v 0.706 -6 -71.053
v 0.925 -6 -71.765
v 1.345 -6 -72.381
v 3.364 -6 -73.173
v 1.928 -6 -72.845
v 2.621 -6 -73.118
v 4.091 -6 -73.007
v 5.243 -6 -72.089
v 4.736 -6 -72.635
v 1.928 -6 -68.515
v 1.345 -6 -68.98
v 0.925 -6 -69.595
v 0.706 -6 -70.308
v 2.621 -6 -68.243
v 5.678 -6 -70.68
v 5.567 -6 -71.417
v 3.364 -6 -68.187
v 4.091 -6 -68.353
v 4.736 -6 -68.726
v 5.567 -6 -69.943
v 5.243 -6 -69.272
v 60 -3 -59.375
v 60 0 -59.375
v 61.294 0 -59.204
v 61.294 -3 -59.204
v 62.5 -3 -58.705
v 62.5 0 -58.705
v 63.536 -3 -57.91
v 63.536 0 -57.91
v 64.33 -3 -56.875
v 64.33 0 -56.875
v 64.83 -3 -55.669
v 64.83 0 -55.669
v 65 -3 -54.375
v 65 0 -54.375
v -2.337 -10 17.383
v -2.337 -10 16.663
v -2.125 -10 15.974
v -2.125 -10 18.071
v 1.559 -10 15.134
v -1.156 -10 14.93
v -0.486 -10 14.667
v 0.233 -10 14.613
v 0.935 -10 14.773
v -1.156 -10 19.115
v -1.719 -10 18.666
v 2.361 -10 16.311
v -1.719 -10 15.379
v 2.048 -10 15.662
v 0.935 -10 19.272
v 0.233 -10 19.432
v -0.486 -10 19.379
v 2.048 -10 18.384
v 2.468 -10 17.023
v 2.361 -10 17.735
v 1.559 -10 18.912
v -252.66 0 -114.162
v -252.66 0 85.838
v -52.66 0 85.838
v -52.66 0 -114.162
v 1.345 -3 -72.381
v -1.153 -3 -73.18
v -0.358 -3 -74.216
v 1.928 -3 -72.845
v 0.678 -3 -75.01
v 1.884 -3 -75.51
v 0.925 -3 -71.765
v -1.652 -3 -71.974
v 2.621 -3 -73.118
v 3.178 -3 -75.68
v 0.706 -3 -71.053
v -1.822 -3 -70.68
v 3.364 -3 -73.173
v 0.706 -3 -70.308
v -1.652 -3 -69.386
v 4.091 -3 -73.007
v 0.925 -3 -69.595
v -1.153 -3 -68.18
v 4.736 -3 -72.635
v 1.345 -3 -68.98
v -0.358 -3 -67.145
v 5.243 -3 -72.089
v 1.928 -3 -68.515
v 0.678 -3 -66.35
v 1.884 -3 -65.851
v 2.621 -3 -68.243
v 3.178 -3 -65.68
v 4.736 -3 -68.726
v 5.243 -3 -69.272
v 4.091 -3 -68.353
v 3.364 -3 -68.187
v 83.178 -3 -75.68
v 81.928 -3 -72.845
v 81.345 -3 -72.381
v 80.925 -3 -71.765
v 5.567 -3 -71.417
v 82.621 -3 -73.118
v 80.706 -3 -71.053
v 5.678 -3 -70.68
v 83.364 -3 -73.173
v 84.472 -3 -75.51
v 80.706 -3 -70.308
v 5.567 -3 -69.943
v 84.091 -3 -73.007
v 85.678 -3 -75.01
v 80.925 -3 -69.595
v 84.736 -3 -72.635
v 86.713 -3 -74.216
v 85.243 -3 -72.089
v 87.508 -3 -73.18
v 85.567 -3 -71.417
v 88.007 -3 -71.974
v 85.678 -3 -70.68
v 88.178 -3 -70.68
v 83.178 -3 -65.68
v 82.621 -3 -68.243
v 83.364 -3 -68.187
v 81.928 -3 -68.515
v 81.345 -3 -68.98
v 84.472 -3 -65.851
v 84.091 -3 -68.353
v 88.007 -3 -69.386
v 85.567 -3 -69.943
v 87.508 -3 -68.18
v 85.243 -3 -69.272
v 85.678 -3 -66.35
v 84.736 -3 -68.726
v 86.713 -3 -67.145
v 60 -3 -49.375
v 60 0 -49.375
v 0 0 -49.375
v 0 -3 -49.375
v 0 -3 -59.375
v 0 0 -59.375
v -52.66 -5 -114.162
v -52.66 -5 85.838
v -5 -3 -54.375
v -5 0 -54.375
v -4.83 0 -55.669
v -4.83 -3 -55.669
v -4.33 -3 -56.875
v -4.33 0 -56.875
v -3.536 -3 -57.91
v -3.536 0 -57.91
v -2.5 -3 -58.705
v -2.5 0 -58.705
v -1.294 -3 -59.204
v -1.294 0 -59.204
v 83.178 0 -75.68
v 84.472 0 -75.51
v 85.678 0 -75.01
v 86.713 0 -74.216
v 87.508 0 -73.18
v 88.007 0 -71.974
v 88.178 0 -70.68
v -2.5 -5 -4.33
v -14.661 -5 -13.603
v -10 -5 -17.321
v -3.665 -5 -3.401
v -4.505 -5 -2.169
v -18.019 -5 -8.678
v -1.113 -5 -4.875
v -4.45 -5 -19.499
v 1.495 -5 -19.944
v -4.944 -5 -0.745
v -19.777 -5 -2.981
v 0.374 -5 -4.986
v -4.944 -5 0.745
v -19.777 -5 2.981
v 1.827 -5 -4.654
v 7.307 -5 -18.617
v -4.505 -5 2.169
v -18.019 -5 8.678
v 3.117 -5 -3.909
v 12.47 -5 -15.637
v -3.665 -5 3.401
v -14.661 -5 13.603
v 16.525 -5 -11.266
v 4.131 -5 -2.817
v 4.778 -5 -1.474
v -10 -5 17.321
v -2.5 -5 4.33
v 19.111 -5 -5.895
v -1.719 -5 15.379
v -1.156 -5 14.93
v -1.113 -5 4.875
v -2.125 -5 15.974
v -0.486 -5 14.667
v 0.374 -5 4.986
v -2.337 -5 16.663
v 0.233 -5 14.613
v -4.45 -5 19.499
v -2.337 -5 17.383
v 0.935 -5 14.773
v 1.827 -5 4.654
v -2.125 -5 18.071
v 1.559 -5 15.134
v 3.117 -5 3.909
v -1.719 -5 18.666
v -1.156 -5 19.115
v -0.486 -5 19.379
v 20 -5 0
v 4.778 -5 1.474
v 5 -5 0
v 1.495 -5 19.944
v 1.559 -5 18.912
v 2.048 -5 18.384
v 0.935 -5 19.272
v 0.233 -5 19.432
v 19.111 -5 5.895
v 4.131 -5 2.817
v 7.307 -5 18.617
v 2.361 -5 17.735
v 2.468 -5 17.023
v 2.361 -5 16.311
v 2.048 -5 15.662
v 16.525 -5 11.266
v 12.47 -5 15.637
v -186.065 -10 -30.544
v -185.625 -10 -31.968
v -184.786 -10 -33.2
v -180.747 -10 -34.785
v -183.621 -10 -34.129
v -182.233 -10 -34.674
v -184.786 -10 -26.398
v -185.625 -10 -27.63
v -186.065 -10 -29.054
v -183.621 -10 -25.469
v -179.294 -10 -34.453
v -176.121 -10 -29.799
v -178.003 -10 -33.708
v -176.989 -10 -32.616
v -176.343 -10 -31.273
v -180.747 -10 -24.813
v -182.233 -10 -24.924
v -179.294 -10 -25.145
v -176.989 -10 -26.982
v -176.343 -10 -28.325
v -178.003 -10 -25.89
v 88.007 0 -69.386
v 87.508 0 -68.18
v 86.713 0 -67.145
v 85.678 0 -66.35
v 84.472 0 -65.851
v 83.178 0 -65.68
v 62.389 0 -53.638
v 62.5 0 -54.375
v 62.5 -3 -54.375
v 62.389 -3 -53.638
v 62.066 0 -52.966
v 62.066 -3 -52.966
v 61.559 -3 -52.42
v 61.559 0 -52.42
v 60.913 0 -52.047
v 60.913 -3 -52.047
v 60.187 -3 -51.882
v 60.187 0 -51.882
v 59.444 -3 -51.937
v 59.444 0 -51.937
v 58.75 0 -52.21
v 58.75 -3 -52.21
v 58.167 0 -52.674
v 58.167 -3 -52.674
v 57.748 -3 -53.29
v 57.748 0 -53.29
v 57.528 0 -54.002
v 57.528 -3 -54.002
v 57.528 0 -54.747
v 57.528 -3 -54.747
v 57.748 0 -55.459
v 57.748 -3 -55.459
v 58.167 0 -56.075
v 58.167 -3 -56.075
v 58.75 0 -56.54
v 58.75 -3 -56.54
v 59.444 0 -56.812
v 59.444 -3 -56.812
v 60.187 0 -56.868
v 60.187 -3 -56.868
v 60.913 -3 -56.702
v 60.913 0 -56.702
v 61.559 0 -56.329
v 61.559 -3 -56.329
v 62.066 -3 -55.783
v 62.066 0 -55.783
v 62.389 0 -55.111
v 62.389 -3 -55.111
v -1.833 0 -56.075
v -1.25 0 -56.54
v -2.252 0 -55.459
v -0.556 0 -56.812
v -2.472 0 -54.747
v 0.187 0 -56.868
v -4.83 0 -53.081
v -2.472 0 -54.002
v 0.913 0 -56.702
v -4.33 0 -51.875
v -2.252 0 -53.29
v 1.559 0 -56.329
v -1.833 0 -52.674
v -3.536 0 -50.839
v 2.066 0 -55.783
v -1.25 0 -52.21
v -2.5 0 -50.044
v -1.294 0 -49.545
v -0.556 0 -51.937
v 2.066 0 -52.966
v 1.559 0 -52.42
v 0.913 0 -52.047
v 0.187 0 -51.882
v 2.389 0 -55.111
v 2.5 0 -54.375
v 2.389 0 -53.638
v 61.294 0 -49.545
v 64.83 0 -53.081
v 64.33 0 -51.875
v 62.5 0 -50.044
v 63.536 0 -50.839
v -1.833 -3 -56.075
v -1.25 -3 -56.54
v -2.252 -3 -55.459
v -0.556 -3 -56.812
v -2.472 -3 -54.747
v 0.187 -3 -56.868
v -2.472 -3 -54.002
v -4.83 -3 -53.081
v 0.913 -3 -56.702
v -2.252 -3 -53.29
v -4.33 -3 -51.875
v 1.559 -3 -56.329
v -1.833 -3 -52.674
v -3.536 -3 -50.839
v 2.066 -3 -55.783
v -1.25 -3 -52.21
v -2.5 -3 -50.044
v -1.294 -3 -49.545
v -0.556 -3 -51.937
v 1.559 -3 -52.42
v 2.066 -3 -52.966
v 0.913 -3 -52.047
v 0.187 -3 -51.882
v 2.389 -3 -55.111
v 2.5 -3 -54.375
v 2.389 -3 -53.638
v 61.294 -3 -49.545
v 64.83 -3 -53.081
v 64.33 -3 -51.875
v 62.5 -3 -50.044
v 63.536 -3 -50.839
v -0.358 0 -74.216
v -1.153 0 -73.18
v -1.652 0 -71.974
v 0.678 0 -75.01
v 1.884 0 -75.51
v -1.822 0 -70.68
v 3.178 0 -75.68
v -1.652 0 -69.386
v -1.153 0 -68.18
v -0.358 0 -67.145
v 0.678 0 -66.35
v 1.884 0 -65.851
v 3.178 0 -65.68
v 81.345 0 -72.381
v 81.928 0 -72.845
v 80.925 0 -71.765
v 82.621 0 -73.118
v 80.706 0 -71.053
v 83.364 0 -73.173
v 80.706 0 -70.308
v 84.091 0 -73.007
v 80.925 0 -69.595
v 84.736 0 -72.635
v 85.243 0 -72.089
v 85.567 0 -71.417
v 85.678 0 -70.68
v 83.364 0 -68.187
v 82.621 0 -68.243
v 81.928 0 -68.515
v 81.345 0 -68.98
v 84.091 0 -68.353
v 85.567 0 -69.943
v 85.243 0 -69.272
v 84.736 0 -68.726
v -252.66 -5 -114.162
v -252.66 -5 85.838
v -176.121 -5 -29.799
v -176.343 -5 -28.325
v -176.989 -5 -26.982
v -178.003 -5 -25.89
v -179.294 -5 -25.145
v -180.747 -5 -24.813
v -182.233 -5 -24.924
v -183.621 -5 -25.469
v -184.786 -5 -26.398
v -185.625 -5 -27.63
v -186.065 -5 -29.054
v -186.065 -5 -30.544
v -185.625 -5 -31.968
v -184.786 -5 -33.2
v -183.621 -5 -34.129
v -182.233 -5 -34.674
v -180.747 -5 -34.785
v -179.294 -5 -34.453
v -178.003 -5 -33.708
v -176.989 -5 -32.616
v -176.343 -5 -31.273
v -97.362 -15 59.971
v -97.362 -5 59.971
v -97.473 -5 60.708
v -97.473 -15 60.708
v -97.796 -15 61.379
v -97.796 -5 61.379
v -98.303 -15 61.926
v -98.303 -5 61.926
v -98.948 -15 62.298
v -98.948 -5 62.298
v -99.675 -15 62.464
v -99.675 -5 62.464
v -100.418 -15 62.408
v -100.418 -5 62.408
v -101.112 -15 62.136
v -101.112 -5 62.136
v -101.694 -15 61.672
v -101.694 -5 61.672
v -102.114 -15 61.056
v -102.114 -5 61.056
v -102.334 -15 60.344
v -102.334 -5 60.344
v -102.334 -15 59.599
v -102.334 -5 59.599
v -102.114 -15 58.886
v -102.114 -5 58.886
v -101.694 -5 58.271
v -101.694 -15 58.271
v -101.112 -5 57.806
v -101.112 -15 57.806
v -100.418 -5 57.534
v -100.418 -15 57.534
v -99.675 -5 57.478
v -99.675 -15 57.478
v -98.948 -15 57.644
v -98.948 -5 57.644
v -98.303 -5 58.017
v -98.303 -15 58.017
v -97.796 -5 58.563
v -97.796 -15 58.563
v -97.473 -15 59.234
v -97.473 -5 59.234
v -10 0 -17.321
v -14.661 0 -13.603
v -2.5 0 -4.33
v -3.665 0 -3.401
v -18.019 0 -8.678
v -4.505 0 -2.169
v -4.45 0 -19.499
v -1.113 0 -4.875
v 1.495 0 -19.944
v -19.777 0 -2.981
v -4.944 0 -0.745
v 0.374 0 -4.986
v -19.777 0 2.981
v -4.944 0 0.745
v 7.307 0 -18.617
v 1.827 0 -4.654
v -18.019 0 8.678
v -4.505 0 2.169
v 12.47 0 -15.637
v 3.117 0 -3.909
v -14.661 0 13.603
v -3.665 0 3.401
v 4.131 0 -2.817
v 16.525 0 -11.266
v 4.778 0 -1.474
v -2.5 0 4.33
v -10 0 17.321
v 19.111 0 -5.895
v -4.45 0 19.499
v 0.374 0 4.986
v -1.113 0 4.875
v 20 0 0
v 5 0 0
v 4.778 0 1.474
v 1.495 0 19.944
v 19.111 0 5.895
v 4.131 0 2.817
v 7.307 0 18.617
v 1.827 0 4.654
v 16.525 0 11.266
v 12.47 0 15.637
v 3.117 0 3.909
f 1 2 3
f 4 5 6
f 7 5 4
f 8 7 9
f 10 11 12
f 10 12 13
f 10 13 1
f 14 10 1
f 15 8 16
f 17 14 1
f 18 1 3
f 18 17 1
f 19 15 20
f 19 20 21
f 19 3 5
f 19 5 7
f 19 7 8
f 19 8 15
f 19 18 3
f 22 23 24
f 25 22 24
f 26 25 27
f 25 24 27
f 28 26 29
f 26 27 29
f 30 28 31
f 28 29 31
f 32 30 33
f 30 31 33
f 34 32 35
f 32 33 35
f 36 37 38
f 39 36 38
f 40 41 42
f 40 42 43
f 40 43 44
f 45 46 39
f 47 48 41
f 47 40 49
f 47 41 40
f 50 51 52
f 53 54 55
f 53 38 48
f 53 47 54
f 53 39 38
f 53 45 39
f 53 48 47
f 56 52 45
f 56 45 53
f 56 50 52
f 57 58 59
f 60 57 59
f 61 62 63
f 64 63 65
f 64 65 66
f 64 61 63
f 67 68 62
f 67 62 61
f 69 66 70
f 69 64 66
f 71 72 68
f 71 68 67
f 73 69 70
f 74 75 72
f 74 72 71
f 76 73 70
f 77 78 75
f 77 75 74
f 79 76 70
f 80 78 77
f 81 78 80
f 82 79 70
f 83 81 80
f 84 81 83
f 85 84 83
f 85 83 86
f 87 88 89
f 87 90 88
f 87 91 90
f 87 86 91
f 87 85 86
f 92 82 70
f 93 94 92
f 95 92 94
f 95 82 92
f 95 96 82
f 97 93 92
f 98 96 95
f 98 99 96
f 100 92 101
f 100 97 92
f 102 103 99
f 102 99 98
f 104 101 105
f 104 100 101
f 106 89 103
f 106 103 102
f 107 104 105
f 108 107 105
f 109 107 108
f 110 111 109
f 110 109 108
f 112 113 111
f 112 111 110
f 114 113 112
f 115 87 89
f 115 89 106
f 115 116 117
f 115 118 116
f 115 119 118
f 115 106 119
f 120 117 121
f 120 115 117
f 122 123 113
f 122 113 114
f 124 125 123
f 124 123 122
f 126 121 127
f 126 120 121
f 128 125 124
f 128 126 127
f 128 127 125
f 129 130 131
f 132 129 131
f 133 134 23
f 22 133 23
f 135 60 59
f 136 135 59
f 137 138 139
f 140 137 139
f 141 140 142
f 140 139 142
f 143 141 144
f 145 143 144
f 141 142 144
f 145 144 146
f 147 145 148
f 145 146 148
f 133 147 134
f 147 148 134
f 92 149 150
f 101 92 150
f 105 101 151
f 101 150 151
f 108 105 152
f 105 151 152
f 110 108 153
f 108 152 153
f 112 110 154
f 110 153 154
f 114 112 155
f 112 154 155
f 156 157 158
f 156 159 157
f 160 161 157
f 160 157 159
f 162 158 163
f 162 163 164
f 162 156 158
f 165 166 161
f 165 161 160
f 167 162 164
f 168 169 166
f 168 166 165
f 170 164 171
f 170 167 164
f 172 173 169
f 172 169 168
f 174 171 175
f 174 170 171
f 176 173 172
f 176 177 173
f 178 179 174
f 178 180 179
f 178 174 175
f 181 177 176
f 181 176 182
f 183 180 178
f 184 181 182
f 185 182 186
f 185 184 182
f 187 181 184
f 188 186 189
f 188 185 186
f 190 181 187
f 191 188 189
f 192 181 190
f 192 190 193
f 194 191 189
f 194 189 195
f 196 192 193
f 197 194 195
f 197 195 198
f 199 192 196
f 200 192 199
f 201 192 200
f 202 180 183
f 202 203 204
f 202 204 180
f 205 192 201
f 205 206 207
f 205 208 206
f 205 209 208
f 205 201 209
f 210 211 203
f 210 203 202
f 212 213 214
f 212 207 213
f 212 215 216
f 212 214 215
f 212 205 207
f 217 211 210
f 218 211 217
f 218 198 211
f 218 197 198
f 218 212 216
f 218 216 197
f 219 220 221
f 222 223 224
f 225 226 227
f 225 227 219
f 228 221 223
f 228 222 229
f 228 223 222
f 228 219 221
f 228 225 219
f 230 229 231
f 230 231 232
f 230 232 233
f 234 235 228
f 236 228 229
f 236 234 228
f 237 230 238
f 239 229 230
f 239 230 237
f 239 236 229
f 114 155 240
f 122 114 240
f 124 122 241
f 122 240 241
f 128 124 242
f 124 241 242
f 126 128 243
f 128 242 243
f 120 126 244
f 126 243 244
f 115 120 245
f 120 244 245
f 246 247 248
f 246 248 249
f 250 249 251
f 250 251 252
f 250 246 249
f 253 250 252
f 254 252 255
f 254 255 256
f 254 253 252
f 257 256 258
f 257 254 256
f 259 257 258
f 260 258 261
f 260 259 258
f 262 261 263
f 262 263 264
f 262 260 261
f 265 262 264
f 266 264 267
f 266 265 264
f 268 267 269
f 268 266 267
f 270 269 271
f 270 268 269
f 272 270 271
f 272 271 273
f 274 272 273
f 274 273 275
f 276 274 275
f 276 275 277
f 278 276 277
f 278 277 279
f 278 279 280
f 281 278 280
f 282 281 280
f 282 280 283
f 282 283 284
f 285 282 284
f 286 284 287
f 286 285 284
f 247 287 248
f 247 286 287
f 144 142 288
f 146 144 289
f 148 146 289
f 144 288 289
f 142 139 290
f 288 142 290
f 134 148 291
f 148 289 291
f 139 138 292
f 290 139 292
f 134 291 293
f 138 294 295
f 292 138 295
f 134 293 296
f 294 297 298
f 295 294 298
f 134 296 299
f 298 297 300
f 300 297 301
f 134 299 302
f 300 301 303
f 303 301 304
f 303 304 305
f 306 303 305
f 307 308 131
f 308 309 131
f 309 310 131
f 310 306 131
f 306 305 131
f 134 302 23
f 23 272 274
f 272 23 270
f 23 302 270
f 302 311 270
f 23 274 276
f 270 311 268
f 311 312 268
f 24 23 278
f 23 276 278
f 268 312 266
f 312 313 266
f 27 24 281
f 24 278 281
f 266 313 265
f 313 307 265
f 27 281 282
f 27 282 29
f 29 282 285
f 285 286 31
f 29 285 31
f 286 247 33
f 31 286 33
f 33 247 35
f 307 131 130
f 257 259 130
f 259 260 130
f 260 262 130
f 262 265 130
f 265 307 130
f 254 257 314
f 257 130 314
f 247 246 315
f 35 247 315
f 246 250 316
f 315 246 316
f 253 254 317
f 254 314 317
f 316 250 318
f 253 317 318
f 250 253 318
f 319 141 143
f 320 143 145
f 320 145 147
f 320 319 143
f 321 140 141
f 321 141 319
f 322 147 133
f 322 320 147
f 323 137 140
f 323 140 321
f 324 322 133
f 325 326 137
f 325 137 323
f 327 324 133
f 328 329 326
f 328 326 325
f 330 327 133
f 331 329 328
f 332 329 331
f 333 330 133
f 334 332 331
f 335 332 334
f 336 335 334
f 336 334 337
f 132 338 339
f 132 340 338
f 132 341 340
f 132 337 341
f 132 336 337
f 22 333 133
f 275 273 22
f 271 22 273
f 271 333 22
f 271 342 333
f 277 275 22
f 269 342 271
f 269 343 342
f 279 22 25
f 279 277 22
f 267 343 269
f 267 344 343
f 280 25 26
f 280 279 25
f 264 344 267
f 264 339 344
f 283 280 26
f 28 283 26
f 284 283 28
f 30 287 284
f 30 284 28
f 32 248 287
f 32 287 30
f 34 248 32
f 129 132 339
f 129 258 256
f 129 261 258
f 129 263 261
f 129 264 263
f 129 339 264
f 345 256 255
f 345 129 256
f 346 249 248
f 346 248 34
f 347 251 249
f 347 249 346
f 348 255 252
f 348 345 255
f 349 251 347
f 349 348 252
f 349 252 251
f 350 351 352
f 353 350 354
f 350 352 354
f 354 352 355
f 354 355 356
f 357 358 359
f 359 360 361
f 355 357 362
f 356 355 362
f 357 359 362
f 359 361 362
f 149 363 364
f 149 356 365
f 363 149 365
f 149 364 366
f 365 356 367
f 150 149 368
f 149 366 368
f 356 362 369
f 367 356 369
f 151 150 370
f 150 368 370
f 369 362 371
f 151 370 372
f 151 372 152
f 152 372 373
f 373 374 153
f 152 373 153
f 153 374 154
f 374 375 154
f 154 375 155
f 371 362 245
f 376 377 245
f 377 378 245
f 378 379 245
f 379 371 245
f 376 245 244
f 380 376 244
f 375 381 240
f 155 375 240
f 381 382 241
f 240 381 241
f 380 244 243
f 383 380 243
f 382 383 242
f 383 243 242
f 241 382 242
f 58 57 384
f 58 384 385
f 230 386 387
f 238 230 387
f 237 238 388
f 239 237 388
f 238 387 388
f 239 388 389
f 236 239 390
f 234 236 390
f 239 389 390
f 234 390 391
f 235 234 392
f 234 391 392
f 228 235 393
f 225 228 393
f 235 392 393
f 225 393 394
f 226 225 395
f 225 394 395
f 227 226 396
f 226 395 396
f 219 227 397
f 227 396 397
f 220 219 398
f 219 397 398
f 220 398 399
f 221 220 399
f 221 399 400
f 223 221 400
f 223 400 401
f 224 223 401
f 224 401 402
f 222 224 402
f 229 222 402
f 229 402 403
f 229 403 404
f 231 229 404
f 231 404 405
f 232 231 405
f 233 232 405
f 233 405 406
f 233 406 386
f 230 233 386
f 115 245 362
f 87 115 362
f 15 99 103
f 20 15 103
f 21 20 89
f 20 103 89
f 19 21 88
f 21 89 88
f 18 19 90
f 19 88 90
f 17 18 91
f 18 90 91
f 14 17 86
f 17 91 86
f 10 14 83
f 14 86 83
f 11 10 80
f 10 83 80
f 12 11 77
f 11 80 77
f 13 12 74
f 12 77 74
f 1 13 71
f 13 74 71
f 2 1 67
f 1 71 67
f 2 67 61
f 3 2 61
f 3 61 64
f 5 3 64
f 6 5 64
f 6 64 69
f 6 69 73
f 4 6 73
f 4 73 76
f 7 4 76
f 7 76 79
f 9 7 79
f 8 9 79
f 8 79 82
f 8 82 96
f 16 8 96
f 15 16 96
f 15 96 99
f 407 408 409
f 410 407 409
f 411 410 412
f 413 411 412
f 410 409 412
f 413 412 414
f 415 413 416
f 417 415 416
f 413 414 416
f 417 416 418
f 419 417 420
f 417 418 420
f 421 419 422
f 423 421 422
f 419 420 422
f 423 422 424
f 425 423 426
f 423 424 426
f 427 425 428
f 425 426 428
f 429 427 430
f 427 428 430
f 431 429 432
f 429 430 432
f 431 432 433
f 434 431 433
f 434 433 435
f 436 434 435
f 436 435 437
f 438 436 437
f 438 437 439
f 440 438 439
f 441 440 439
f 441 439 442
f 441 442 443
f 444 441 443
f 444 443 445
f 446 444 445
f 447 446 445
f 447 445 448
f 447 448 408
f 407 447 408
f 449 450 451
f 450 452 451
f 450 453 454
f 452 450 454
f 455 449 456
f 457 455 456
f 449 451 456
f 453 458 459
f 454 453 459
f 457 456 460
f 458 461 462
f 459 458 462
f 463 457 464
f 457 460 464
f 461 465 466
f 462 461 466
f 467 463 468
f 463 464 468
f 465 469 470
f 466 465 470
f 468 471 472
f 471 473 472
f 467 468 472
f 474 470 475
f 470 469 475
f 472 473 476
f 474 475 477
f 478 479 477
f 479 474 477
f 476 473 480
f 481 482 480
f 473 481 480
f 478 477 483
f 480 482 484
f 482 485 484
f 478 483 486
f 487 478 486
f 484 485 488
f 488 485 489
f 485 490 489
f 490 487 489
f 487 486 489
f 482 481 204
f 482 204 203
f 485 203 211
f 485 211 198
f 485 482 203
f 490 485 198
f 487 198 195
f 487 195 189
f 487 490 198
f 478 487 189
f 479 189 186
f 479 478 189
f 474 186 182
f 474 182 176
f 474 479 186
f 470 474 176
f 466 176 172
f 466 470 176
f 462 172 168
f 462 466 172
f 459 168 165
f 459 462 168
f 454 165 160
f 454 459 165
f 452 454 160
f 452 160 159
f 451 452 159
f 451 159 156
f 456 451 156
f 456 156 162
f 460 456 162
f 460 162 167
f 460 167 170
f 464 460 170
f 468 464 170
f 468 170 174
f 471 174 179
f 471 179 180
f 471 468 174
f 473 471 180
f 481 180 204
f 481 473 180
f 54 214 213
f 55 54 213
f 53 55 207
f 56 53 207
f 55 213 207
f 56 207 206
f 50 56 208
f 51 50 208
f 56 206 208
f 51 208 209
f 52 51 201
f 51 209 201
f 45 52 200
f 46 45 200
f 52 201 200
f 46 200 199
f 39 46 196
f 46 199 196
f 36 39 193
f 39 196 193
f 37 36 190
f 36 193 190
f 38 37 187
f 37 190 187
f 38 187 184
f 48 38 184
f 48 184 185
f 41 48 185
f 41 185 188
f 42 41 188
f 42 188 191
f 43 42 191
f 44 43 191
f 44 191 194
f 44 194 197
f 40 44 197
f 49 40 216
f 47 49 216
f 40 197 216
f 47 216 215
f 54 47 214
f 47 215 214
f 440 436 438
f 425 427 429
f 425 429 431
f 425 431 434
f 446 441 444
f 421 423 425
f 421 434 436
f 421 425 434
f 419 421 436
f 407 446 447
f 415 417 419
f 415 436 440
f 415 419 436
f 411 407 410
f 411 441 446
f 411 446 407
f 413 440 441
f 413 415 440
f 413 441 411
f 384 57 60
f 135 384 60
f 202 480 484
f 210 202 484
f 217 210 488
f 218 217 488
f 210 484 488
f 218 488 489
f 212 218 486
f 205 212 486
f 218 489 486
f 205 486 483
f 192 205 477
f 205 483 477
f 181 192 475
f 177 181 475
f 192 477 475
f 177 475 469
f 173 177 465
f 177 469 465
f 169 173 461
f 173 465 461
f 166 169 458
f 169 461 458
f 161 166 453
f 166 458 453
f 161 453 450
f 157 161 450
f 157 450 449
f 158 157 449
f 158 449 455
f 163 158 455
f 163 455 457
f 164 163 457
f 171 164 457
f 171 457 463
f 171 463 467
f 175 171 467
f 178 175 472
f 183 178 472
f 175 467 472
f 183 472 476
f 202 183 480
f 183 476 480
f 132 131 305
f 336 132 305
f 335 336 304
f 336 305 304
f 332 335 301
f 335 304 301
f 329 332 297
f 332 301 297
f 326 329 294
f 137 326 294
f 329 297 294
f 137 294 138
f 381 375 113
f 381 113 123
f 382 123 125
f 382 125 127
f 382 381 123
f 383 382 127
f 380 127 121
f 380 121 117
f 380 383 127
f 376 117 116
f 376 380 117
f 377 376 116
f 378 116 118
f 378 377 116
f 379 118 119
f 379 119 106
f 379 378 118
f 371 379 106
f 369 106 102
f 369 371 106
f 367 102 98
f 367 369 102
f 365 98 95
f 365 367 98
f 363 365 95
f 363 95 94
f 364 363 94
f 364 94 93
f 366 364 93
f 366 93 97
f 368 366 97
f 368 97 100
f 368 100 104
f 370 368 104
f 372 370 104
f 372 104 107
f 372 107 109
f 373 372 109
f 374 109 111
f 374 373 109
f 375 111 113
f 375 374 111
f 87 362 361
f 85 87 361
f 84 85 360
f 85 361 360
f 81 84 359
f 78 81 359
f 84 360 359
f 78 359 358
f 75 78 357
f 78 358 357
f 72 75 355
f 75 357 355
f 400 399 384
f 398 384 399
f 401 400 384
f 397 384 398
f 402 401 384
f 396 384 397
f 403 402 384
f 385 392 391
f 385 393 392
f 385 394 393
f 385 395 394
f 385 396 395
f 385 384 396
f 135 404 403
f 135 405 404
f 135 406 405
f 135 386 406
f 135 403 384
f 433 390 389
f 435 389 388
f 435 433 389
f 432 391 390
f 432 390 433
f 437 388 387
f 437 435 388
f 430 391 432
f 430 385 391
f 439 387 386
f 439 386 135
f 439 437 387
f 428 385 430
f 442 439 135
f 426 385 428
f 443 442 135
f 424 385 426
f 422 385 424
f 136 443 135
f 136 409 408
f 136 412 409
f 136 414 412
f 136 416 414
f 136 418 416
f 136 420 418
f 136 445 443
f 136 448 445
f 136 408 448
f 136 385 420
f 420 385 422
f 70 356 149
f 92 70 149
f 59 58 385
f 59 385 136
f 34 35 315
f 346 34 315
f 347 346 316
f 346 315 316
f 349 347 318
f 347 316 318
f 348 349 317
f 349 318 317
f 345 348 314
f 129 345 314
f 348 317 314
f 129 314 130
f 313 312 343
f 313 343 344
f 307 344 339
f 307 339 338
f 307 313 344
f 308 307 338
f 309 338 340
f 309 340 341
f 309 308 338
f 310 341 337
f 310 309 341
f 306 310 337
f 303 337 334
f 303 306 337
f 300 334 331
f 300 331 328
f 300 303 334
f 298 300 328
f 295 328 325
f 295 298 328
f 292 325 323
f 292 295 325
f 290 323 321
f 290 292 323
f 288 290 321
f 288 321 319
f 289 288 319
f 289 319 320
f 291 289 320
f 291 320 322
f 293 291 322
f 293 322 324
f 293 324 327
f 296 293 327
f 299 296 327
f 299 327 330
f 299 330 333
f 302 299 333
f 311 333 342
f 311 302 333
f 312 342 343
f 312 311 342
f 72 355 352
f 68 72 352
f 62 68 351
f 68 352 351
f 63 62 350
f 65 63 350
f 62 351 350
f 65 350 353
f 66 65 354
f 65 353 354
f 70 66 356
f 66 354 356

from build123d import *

# Parameters (mm, degrees)
F0_R      = 20
F0_R_2    = 5
F1_DEPTH  = 5
F2_W      = 200
F2_H      = 200
F2_R      = 5
F2_R_2    = 2.5
F3_DEPTH  = 5
F4_DEPTH  = 10
F5_R      = 2.416373
F6_DEPTH  = 5
F7_R      = 2.5
F9_DEPTH  = 3
F8_R      = 2.5
F10_DEPTH = 3
F11_DEPTH = 6
F12_DEPTH = 15


with BuildPart() as f1:
    # F0 (on Front) → F1 (new body)
    with BuildSketch(Plane.XZ):
        Circle(F0_R)
        Circle(F0_R_2, mode=Mode.SUBTRACT)
    extrude(amount=F1_DEPTH)

    # F5 (on face) → F6 (join)
    with BuildSketch(Plane.XZ.offset(5)):
        with Locations((0.051965, 17.022764)):
            Circle(F5_R)
    extrude(amount=F6_DEPTH)


with BuildPart() as f3:
    # F2 (on Front) → F3 (new body)
    with BuildSketch(Plane.XZ):
        with Locations((-152.659772, -14.162371)):
            Rectangle(F2_W, F2_H)
        with Locations((-181.120619, -29.79908)):
            Circle(F2_R, mode=Mode.SUBTRACT)
        with Locations((-99.861644, 59.971109)):
            Circle(F2_R_2, mode=Mode.SUBTRACT)
    extrude(amount=F3_DEPTH)

    # F2 (on Front) → F4 (join)
    with BuildSketch(Plane.XZ):
        with Locations((-181.120619, -29.79908)):
            Circle(F2_R)
    extrude(amount=F4_DEPTH)

    # F2 (on Front) → F12 (join)
    with BuildSketch(Plane.XZ):
        with Locations((-99.861644, 59.971109)):
            Circle(F2_R_2)
    extrude(amount=F12_DEPTH)


with BuildPart() as f9:
    # F7 (on Front) → F9 (new body)
    with BuildSketch(Plane.XZ):
        with BuildLine():
            Line((60, -49.374602), (0, -49.374602))
            ThreePointArc((0, -49.374602), (-3.535534, -50.839068), (-5, -54.374602))
            ThreePointArc((-5, -54.374602), (-3.535534, -57.910136), (0, -59.374602))
            Line((0, -59.374602), (60, -59.374602))
            ThreePointArc((60, -59.374602), (63.535534, -57.910136), (65, -54.374602))
            ThreePointArc((65, -54.374602), (63.535534, -50.839068), (60, -49.374602))
        make_face()
        with Locations((0, -54.374602)):
            Circle(F7_R, mode=Mode.SUBTRACT)
        with Locations((60, -54.374602)):
            Circle(F7_R, mode=Mode.SUBTRACT)
    extrude(amount=F9_DEPTH)


with BuildPart() as f10:
    # F8 (on Front) → F10 (new body)
    with BuildSketch(Plane.XZ):
        with BuildLine():
            Line((83.177605, -65.680205), (3.177605, -65.680205))
            ThreePointArc((3.177605, -65.680205), (-0.357929, -67.144671), (-1.822395, -70.680205))
            ThreePointArc((-1.822395, -70.680205), (-0.357929, -74.215739), (3.177605, -75.680205))
            Line((3.177605, -75.680205), (83.177605, -75.680205))
            ThreePointArc((83.177605, -75.680205), (86.713139, -74.215739), (88.177605, -70.680205))
            ThreePointArc((88.177605, -70.680205), (86.713139, -67.144671), (83.177605, -65.680205))
        make_face()
        with Locations((3.177605, -70.680205)):
            Circle(F8_R, mode=Mode.SUBTRACT)
        with Locations((83.177605, -70.680205)):
            Circle(F8_R, mode=Mode.SUBTRACT)
    extrude(amount=F10_DEPTH)

    # F8 (on Front) → F11 (join)
    with BuildSketch(Plane.XZ):
        with Locations((3.177605, -70.680205)):
            Circle(F8_R)
    extrude(amount=F11_DEPTH)


solid = Compound([f1.part, f3.part, f9.part, f10.part])
